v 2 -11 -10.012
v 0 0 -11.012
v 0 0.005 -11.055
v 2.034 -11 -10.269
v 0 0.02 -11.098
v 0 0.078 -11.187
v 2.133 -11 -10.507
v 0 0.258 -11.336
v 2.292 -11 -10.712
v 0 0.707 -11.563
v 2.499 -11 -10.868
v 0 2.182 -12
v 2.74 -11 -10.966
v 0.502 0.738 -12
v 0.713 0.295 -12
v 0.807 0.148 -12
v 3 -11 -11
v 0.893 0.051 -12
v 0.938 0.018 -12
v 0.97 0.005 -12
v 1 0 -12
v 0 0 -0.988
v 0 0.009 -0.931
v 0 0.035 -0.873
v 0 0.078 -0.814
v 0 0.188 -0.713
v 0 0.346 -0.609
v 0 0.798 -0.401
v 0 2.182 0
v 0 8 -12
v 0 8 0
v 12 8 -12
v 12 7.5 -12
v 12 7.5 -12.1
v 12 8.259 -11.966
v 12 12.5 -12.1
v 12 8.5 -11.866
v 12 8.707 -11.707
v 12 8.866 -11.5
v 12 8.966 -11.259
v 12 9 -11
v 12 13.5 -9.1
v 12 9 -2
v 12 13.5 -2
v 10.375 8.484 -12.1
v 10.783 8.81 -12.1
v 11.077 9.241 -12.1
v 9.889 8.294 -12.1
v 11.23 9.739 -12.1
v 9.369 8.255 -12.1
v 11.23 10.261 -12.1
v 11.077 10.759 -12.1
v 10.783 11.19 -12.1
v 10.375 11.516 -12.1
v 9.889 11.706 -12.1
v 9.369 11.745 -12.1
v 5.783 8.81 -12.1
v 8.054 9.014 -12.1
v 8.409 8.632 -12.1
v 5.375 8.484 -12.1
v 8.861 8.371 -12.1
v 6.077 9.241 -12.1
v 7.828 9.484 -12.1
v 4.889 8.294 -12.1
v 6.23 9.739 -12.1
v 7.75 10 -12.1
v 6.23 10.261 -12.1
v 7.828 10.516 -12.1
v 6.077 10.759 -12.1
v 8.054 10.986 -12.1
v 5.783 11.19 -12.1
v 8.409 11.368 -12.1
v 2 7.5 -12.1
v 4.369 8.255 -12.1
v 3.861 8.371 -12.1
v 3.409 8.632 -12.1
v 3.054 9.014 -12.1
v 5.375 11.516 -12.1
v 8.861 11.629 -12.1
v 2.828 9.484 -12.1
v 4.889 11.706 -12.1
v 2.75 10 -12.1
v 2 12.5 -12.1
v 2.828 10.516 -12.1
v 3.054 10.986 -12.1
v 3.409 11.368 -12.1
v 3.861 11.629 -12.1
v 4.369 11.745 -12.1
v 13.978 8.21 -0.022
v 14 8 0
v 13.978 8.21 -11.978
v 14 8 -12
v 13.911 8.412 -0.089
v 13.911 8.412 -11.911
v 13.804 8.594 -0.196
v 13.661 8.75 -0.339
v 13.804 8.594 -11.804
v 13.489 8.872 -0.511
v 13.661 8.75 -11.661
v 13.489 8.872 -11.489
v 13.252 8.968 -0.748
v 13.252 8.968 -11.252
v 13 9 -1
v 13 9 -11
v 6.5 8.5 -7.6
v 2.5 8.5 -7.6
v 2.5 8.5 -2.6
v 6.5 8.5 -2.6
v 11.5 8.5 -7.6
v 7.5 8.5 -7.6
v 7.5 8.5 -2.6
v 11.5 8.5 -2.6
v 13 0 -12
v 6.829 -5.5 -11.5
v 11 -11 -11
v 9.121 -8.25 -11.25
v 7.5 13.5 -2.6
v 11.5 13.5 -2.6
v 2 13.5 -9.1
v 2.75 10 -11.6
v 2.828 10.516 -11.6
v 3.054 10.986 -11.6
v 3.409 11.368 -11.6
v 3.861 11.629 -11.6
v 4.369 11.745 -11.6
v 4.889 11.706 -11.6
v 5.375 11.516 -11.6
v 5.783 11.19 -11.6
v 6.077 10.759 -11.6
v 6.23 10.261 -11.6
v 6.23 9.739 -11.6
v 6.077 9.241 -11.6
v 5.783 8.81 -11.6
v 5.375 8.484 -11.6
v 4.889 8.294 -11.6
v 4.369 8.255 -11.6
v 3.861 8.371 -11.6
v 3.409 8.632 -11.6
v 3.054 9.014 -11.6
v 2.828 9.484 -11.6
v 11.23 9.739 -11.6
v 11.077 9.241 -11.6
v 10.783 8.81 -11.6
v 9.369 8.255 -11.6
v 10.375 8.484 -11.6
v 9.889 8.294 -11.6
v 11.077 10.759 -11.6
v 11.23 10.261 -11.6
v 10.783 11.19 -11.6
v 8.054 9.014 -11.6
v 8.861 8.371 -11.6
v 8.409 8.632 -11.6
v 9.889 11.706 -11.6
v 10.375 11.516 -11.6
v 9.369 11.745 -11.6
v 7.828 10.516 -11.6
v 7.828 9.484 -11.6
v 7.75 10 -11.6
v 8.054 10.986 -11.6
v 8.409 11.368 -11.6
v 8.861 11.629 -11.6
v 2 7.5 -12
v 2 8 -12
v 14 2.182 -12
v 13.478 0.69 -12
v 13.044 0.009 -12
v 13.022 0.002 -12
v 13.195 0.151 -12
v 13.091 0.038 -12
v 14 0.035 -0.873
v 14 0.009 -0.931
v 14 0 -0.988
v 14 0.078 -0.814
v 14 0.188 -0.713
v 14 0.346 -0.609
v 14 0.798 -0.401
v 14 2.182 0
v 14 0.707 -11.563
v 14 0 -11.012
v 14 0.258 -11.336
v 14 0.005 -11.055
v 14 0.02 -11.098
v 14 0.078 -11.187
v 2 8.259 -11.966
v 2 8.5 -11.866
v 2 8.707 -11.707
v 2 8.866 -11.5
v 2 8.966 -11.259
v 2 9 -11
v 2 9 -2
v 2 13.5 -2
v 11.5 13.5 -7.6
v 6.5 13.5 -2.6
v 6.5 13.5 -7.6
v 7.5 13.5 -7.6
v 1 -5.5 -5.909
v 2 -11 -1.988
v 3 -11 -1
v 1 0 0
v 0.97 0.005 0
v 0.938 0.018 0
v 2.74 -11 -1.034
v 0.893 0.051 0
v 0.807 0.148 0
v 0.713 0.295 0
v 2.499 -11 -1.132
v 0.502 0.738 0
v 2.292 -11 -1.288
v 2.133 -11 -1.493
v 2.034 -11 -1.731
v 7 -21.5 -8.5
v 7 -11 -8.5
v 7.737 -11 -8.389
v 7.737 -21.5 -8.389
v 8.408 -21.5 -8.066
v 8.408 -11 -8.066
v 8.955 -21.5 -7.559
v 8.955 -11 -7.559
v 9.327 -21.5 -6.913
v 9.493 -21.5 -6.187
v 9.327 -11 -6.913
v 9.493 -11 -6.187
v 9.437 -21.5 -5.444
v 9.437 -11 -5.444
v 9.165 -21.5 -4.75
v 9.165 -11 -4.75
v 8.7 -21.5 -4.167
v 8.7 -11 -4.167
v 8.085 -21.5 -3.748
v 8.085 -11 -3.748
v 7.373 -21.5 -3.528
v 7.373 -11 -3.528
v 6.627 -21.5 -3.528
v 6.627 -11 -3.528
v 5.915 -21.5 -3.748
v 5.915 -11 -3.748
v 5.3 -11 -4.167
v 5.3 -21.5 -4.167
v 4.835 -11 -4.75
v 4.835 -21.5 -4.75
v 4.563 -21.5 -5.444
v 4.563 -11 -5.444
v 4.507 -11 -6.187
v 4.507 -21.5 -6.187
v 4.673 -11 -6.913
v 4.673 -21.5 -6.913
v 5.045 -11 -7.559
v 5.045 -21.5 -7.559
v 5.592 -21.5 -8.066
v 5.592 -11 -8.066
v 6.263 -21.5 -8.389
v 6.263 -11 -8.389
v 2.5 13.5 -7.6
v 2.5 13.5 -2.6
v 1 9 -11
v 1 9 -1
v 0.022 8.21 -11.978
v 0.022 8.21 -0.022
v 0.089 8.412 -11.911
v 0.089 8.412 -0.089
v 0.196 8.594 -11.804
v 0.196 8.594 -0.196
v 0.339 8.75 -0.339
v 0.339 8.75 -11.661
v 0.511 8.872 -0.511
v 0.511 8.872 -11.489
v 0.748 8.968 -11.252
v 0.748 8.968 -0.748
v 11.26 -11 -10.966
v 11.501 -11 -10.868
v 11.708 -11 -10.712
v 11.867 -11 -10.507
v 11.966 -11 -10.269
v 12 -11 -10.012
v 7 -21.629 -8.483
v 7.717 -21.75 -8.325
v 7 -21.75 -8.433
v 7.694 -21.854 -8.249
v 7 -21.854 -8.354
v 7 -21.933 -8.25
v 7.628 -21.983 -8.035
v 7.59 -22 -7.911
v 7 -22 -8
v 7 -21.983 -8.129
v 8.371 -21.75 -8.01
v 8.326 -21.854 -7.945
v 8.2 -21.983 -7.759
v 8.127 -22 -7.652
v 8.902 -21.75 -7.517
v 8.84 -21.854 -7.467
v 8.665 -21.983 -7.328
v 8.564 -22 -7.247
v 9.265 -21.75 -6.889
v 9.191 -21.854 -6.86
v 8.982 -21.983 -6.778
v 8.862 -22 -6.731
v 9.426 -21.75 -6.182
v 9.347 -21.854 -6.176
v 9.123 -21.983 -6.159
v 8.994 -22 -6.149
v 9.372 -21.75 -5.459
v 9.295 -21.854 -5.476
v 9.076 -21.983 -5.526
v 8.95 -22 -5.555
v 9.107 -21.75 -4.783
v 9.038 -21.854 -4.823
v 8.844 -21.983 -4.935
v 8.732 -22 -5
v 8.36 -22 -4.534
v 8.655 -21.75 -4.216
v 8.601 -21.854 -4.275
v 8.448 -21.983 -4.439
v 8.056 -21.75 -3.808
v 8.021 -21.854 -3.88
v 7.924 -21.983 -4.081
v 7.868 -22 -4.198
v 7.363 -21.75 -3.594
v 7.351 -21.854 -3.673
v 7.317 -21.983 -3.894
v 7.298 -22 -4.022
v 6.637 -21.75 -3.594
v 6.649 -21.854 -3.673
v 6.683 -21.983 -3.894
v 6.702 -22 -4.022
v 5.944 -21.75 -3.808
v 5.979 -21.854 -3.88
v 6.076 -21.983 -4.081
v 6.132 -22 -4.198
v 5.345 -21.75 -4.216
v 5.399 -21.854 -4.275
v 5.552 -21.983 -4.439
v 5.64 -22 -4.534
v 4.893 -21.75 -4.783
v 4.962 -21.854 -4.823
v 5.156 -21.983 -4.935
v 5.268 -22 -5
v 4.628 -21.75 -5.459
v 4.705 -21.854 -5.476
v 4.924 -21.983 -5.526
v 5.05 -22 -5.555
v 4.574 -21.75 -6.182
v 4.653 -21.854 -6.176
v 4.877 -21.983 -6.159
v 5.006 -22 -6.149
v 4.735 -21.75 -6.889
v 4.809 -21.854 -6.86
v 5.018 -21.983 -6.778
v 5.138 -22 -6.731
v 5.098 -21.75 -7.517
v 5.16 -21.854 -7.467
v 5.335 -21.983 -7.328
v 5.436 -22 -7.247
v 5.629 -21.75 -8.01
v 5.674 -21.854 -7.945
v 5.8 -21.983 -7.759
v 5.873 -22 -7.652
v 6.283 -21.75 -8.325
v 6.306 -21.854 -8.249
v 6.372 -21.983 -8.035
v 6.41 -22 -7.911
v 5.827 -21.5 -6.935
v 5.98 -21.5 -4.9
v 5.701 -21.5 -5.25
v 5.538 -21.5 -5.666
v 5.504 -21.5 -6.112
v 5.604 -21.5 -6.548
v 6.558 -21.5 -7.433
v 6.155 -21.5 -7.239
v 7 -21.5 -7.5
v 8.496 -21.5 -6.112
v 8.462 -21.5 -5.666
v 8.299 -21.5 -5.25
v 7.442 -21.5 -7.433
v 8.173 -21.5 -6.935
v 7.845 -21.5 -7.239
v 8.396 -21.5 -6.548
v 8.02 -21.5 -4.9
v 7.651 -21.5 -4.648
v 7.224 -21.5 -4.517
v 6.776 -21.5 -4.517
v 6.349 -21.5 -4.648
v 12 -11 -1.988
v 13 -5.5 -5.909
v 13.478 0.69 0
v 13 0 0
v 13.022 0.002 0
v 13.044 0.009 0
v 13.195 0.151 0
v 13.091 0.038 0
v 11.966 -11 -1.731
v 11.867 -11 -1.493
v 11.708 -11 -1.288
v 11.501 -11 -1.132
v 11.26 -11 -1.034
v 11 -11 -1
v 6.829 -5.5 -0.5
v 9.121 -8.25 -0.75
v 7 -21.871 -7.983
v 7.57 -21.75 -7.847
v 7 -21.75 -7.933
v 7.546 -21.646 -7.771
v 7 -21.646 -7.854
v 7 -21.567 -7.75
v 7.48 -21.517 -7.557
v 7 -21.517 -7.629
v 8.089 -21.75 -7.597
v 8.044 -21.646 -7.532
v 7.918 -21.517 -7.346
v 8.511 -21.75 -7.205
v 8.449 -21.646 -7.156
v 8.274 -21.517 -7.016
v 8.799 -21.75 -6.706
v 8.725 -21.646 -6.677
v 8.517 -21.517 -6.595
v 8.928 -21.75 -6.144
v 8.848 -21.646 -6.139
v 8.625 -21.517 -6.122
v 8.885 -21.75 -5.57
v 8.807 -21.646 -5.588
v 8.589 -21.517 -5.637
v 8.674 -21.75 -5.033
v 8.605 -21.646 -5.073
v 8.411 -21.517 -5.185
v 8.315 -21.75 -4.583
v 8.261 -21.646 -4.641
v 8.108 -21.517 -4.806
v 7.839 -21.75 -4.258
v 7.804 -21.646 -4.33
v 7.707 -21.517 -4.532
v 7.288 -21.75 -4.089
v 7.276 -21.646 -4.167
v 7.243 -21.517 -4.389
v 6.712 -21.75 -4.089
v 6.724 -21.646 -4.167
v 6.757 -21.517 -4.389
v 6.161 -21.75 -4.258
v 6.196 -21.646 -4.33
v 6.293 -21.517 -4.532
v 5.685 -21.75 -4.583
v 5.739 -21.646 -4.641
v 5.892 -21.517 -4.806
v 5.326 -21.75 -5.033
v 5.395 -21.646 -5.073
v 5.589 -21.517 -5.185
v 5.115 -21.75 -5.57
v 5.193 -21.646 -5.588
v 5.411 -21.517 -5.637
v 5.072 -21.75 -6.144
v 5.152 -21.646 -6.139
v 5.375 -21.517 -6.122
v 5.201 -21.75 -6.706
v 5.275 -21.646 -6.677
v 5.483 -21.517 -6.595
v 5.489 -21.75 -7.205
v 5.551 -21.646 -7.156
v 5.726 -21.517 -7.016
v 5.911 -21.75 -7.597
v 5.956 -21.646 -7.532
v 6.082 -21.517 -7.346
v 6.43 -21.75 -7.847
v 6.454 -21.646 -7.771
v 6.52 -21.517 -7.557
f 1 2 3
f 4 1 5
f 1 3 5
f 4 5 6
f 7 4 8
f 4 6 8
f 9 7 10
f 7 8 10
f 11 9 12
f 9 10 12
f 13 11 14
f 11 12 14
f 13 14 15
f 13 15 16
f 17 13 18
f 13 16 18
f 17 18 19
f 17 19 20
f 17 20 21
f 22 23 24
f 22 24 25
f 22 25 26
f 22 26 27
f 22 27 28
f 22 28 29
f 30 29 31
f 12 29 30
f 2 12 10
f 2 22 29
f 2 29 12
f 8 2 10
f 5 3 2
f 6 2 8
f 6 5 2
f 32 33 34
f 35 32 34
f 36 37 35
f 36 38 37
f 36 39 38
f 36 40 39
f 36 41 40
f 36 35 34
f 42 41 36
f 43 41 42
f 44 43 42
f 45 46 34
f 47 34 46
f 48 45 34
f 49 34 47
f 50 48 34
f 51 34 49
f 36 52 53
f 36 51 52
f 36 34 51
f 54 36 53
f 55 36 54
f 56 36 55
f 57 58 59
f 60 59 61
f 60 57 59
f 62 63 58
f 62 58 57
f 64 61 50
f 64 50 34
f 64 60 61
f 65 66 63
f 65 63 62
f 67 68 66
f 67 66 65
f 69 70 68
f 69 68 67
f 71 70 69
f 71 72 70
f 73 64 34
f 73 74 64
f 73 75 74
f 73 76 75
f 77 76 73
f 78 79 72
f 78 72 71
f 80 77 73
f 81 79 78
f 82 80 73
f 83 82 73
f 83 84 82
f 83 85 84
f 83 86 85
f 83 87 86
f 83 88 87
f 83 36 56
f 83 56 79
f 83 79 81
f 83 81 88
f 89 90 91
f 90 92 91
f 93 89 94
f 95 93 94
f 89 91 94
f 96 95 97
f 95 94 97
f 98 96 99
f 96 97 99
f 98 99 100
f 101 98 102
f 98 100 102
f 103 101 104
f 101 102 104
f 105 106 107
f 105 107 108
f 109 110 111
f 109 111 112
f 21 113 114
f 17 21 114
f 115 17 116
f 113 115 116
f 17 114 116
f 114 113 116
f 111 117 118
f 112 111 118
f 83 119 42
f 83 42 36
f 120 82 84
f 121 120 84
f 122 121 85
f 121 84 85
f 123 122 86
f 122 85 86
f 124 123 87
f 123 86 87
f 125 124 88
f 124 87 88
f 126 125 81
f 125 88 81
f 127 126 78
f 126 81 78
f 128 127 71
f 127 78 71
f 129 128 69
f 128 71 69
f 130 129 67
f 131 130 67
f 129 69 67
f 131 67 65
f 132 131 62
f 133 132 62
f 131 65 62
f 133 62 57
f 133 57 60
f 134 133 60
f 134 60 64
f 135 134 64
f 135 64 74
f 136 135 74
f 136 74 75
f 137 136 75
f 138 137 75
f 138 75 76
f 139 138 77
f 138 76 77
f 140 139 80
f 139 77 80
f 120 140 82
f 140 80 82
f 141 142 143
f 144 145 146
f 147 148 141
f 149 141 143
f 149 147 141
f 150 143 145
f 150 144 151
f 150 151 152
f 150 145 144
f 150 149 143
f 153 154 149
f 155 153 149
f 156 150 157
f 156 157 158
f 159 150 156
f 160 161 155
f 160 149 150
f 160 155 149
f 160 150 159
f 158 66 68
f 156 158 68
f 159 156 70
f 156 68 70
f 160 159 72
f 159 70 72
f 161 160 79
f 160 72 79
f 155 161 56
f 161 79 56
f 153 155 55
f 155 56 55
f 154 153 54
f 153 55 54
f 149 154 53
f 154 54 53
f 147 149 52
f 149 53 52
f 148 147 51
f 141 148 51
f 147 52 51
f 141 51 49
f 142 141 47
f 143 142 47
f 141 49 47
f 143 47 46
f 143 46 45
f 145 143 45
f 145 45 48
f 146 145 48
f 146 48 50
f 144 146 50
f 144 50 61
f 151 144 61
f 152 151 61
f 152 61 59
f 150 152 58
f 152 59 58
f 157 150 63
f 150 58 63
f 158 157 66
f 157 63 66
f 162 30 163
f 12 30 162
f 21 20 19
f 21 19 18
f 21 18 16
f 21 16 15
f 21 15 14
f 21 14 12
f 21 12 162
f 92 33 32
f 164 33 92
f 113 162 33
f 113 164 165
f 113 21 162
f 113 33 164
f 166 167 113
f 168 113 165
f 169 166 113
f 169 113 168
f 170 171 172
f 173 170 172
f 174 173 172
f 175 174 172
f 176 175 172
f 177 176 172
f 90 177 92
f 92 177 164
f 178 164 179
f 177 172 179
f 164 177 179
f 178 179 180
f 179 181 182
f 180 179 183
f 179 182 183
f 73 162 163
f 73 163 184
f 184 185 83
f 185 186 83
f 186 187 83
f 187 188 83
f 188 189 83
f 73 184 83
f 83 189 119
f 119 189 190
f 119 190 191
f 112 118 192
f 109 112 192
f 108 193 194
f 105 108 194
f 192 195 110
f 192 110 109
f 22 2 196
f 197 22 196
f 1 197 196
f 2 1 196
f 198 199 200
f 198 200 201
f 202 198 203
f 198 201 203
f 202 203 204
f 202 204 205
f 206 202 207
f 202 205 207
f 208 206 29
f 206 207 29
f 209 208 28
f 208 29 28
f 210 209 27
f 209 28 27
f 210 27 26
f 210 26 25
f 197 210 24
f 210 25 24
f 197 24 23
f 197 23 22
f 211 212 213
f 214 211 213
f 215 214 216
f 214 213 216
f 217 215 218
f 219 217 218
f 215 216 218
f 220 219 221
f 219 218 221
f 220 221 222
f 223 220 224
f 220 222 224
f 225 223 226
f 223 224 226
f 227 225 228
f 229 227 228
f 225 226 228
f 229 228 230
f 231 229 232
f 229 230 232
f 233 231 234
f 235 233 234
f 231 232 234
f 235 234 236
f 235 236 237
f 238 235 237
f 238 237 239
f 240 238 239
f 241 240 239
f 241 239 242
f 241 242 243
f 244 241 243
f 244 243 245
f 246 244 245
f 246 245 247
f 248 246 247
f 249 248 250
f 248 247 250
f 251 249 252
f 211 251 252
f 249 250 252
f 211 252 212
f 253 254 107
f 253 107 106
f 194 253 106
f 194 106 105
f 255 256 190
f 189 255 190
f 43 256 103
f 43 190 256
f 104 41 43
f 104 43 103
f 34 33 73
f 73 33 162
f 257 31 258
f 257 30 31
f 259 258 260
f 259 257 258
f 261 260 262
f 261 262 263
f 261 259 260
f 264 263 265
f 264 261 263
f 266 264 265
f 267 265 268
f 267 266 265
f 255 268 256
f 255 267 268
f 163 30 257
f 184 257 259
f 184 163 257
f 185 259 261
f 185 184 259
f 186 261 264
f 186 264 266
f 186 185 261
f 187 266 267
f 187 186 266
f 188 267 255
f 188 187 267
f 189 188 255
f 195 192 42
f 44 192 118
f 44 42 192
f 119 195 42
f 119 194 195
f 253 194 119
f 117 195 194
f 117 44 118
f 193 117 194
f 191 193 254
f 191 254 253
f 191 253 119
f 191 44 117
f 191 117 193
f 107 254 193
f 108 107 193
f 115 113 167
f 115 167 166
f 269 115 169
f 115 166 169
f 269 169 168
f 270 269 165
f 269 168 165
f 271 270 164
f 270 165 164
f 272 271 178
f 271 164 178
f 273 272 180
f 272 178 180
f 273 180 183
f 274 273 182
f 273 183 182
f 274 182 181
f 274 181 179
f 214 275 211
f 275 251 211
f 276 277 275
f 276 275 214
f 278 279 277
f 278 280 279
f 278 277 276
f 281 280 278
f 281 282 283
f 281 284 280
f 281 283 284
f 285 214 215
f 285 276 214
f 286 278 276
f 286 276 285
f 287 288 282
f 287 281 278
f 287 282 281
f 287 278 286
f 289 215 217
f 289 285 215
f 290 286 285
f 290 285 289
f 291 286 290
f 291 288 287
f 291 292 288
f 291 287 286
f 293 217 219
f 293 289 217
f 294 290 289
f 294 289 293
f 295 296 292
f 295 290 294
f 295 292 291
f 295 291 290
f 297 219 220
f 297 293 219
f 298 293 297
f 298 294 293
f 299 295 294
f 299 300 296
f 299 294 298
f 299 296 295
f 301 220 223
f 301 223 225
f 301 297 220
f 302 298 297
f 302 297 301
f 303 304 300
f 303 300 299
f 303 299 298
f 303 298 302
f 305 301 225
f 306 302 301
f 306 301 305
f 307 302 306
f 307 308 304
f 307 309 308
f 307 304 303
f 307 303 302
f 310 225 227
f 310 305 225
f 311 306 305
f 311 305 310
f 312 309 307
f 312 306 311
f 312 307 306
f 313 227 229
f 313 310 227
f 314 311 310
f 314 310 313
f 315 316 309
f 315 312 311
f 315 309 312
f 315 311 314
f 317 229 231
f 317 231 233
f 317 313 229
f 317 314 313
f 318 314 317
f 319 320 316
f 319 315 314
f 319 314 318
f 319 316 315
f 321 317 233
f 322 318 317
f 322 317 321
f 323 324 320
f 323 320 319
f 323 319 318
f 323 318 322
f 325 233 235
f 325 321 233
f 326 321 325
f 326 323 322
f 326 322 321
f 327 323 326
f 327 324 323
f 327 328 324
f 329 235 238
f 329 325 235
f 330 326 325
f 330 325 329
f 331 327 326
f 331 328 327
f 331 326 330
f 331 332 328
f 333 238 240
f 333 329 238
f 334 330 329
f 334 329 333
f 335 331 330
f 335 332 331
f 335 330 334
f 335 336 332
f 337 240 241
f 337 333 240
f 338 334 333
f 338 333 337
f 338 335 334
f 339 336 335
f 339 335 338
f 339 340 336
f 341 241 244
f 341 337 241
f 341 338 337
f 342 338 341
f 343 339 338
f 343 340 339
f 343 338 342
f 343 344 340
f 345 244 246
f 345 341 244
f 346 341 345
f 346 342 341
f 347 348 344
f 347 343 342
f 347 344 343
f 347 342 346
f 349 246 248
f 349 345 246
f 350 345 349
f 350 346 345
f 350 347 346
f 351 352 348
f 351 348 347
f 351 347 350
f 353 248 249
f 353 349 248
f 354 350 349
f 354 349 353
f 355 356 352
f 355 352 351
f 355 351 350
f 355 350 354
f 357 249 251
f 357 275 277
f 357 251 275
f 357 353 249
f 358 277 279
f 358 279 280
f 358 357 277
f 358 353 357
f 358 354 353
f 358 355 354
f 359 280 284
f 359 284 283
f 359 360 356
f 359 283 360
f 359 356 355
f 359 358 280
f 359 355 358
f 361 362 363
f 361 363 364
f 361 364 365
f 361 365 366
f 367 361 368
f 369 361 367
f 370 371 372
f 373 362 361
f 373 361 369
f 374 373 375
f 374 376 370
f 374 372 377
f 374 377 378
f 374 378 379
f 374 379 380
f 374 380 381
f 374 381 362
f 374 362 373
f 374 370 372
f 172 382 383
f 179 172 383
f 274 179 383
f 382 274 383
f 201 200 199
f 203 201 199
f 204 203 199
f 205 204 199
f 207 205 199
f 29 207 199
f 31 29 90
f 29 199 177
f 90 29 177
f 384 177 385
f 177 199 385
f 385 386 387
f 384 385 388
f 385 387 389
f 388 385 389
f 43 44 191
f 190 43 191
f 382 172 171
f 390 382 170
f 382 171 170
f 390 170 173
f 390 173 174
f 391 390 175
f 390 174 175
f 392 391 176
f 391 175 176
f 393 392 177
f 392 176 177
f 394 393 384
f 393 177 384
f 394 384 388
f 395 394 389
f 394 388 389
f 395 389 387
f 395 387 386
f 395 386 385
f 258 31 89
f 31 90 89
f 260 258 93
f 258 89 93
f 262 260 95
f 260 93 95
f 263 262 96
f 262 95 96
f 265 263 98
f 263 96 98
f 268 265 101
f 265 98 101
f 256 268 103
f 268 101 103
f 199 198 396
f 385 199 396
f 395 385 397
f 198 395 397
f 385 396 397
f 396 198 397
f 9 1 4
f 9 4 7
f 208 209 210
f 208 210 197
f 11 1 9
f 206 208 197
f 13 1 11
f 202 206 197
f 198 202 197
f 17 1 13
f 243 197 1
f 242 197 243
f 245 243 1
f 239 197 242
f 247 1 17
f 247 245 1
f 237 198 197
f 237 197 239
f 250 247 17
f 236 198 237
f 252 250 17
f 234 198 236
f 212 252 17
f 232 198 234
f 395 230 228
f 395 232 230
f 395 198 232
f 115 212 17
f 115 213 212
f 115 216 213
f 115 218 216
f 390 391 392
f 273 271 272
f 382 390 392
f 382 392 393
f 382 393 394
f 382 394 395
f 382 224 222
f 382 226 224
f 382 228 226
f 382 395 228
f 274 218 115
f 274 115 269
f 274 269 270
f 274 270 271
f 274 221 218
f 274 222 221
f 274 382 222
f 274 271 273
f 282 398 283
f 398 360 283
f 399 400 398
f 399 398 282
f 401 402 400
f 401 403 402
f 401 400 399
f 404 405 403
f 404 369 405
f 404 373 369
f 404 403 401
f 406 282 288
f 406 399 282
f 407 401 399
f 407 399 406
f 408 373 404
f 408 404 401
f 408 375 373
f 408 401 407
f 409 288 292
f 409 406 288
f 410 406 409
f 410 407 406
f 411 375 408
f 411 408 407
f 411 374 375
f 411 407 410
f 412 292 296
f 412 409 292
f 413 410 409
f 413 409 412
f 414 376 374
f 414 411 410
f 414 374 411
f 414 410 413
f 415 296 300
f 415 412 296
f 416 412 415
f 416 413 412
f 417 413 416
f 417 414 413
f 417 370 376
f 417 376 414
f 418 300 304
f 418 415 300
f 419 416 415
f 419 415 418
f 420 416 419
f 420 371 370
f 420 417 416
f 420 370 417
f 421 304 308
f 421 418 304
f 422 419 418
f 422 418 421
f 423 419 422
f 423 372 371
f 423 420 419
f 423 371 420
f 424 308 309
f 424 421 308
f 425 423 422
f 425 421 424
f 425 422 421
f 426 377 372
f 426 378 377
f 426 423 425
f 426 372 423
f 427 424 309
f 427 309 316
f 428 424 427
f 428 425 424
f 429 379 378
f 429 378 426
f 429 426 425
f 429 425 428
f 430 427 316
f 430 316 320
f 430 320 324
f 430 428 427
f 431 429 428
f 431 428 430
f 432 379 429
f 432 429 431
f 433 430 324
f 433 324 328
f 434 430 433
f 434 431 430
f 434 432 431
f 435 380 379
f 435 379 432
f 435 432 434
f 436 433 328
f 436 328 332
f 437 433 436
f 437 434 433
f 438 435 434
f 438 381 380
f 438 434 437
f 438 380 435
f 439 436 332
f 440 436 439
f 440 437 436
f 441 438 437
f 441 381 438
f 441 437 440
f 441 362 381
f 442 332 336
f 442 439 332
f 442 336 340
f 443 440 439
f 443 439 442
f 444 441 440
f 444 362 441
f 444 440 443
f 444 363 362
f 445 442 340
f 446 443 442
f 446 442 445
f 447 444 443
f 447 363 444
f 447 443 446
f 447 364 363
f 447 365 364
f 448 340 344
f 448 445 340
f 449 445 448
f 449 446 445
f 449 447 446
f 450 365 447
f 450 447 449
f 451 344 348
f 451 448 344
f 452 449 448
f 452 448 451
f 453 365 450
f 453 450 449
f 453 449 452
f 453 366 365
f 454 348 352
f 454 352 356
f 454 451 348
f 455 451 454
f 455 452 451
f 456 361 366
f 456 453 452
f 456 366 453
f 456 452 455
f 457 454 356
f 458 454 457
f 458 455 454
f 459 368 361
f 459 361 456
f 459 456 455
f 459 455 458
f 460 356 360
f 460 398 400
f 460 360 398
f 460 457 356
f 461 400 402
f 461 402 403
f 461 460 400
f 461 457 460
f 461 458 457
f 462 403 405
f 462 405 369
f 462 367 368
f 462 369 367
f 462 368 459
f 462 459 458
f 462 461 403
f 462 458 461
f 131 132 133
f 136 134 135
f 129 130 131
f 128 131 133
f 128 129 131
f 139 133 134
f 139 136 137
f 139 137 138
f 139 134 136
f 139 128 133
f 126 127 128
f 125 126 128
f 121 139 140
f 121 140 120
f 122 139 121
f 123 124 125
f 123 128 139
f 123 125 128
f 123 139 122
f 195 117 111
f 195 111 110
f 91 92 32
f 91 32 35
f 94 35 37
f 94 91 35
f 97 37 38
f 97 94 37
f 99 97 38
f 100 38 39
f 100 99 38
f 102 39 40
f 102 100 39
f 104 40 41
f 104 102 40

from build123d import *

# Parameters (mm, degrees)
SKETCH_1_W          = 14
SKETCH_1_H          = 12
EXTRUDE_1_DEPTH     = 9
FILLET_2_R          = 1
FILLET_3_R          = 1
SKETCH_6_R          = 2.5
EXTRUDE_2_DEPTH     = 11
FILLET_4_R          = 0.5
SKETCH_7_R          = 2
CUT_EXTRUDE_1_DEPTH = 0.5
FILLET_5_R          = 0.5
SKETCH_8_W          = 10
SKETCH_8_H          = 5.607572988
CUT_EXTRUDE_2_DEPTH = 10
SKETCH_9_W          = 10
SKETCH_9_H          = 6
EXTRUDE_3_DEPTH     = 10.1
SKETCH_10_R         = 1.75
CUT_EXTRUDE_3_DEPTH = 0.5
CUT_EXTRUDE_4_DEPTH = 28.828223084
SKETCH_12_W         = 4
SKETCH_12_H         = 5
CUT_EXTRUDE_5_DEPTH = 5


# Some blends are built 0.0001 mm under size
with BuildPart() as part:
    # 草图1 → 凸台-拉伸1 (new body)
    with BuildSketch(Plane(origin=(0, 0, 0), x_dir=(1, 0, 0), z_dir=(0, 1, 0))):
        with Locations((7, 6)):
            Rectangle(SKETCH_1_W, SKETCH_1_H)
    extrude(amount=EXTRUDE_1_DEPTH)

    # 圆角2
    fillet_2_edges = [part.edges().sort_by_distance(p)[0] for p in [
        (14, 9, -6),
        (7, 9, -12),
        (0, 9, -6),
        (7, 9, 0),
    ]]
    fillet(fillet_2_edges, radius=FILLET_2_R)

    # 草图4 → 放样1 section 0
    with BuildSketch(Plane.XZ):
        with BuildLine():
            Line((0, 0), (14, 0))
            Line((14, 0), (14, -12))
            Line((14, -12), (0, -12))
            Line((0, -12), (0, 0))
        make_face()
    # 草图5 → 放样1 section 1
    with BuildSketch(Plane(origin=(0, -11, 0), x_dir=(-1, 0, 0), z_dir=(0, -1, 0))):
        with BuildLine():
            Line((-2, 1), (-12, 1))
            Line((-12, 1), (-12, 11))
            Line((-12, 11), (-2, 11))
            Line((-2, 11), (-2, 1))
        make_face()
    loft()

    # 圆角3
    # the kernel refuses this fillet: 1 mm, written as the material it takes off along each edge
    with BuildSketch(Plane(origin=(14.438278825, 2.410533539, -12.219139413), x_dir=(0.015936381457793344, 0.08765009801785527, 0.9960238411119947), z_dir=(-0.1781741612749496, -0.9799578870122228, 0.0890870806374748)), Plane(origin=(14.438278825, 2.410533539, 0.219139413), x_dir=(-0.9839989676081822, 0.17744243678180333, 0.016131130616527562), z_dir=(-0.1781741612749496, -0.9799578870122228, -0.08908708063747467))) as fillet_3_piece_1:
        with BuildLine():
            CenterArc((FILLET_3_R * 0.983933522321, FILLET_3_R), FILLET_3_R, 180.927975892, 89.072024108)
            Line((-FILLET_3_R * 0.0159353215369, FILLET_3_R * 0.983804473396), (0, 0))
            Line((0, 0), (FILLET_3_R * 0.983933522321, 0))
        make_face()
    extrude(amount=16.144639772, mode=Mode.SUBTRACT)
    with BuildSketch(Plane(origin=(-0.438278825, 2.410533539, -12.219139413), x_dir=(-0.015936381457791863, 0.08765009801785537, 0.9960238411119947), z_dir=(0.1781741612749496, -0.9799578870122228, 0.08908708063747463)), Plane(origin=(-0.438278825, 2.410533539, 0.219139413), x_dir=(0.9839989676081822, 0.17744243678180333, 0.016131130616527607), z_dir=(0.1781741612749496, -0.9799578870122228, -0.0890870806374748))) as fillet_3_piece_2:
        with BuildLine():
            CenterArc((FILLET_3_R * 0.983933522321, -FILLET_3_R), FILLET_3_R, 90, 89.072024108)
            Line((-FILLET_3_R * 0.0159353215369, -FILLET_3_R * 0.983804473396), (0, 0))
            Line((0, 0), (FILLET_3_R * 0.983933522321, 0))
        make_face()
    extrude(amount=16.144639772, mode=Mode.SUBTRACT)

    # 草图6 → 凸台-拉伸2 (add)
    with BuildSketch(Plane.XZ.offset(11)):
        with Locations(Location((7, -6, 0), (0, 0, 270))):
            Circle(SKETCH_6_R)
    extrude(amount=EXTRUDE_2_DEPTH)

    # 圆角4
    fillet_4_edges = [part.edges().sort_by_distance(p)[0] for p in [
        (7, -22, -3.5),
    ]]
    fillet(fillet_4_edges, radius=FILLET_4_R)

    # 草图7 → 切除-拉伸1 (cut)
    with BuildSketch(Plane.XZ.offset(22)):
        with Locations(Location((7, -6, 0), (0, 0, 270))):
            Circle(SKETCH_7_R)
    extrude(amount=-CUT_EXTRUDE_1_DEPTH, mode=Mode.SUBTRACT)

    # 圆角5
    fillet_5_edges = [part.edges().sort_by_distance(p)[0] for p in [
        (7, -21.5, -4),
    ]]
    fillet(fillet_5_edges, radius=FILLET_5_R - 0.0001)  # a hair under: the kernel refuses the full size

    # 草图8 → 切除-拉伸2 (cut)
    with BuildSketch(Plane(origin=(0, 0, -12), x_dir=(-1, 0, 0), z_dir=(0, 0, -1))):
        with Locations((-7, 10.303786494)):
            Rectangle(SKETCH_8_W, SKETCH_8_H)
    extrude(amount=-CUT_EXTRUDE_2_DEPTH, mode=Mode.SUBTRACT)

    # 草图9 → 凸台-拉伸3 (add)
    with BuildSketch(Plane(origin=(0, 0, -2), x_dir=(-1, 0, 0), z_dir=(0, 0, -1))):
        with Locations((-7, 10.5)):
            Rectangle(SKETCH_9_W, SKETCH_9_H)
    extrude(amount=EXTRUDE_3_DEPTH)

    # 草图10 → 切除-拉伸3 (cut)
    with BuildSketch(Plane(origin=(0, 0, -12.1), x_dir=(-1, 0, 0), z_dir=(0, 0, -1))):
        with Locations((-4.5, 10)):
            Circle(SKETCH_10_R)
        with Locations((-9.5, 10)):
            Circle(SKETCH_10_R)
    extrude(amount=-CUT_EXTRUDE_3_DEPTH, mode=Mode.SUBTRACT)

    # 草图11 → 切除-拉伸4 (cut, through all)
    with BuildSketch(Plane.ZY.offset(-2)):
        Polygon((-12.1, 12.5), (-12.1, 13.5), (-9.1, 13.5), align=None)
    extrude(amount=-CUT_EXTRUDE_4_DEPTH, mode=Mode.SUBTRACT)

    # 草图12 → 切除-拉伸5 (cut)
    with BuildSketch(Plane(origin=(0, 13.5, 0), x_dir=(1, 0, 0), z_dir=(0, 1, 0))):
        with Locations((4.5, 5.1)):
            Rectangle(SKETCH_12_W, SKETCH_12_H)
        with Locations((9.5, 5.1)):
            Rectangle(SKETCH_12_W, SKETCH_12_H)
    extrude(amount=-CUT_EXTRUDE_5_DEPTH, mode=Mode.SUBTRACT)


solid = part.part
